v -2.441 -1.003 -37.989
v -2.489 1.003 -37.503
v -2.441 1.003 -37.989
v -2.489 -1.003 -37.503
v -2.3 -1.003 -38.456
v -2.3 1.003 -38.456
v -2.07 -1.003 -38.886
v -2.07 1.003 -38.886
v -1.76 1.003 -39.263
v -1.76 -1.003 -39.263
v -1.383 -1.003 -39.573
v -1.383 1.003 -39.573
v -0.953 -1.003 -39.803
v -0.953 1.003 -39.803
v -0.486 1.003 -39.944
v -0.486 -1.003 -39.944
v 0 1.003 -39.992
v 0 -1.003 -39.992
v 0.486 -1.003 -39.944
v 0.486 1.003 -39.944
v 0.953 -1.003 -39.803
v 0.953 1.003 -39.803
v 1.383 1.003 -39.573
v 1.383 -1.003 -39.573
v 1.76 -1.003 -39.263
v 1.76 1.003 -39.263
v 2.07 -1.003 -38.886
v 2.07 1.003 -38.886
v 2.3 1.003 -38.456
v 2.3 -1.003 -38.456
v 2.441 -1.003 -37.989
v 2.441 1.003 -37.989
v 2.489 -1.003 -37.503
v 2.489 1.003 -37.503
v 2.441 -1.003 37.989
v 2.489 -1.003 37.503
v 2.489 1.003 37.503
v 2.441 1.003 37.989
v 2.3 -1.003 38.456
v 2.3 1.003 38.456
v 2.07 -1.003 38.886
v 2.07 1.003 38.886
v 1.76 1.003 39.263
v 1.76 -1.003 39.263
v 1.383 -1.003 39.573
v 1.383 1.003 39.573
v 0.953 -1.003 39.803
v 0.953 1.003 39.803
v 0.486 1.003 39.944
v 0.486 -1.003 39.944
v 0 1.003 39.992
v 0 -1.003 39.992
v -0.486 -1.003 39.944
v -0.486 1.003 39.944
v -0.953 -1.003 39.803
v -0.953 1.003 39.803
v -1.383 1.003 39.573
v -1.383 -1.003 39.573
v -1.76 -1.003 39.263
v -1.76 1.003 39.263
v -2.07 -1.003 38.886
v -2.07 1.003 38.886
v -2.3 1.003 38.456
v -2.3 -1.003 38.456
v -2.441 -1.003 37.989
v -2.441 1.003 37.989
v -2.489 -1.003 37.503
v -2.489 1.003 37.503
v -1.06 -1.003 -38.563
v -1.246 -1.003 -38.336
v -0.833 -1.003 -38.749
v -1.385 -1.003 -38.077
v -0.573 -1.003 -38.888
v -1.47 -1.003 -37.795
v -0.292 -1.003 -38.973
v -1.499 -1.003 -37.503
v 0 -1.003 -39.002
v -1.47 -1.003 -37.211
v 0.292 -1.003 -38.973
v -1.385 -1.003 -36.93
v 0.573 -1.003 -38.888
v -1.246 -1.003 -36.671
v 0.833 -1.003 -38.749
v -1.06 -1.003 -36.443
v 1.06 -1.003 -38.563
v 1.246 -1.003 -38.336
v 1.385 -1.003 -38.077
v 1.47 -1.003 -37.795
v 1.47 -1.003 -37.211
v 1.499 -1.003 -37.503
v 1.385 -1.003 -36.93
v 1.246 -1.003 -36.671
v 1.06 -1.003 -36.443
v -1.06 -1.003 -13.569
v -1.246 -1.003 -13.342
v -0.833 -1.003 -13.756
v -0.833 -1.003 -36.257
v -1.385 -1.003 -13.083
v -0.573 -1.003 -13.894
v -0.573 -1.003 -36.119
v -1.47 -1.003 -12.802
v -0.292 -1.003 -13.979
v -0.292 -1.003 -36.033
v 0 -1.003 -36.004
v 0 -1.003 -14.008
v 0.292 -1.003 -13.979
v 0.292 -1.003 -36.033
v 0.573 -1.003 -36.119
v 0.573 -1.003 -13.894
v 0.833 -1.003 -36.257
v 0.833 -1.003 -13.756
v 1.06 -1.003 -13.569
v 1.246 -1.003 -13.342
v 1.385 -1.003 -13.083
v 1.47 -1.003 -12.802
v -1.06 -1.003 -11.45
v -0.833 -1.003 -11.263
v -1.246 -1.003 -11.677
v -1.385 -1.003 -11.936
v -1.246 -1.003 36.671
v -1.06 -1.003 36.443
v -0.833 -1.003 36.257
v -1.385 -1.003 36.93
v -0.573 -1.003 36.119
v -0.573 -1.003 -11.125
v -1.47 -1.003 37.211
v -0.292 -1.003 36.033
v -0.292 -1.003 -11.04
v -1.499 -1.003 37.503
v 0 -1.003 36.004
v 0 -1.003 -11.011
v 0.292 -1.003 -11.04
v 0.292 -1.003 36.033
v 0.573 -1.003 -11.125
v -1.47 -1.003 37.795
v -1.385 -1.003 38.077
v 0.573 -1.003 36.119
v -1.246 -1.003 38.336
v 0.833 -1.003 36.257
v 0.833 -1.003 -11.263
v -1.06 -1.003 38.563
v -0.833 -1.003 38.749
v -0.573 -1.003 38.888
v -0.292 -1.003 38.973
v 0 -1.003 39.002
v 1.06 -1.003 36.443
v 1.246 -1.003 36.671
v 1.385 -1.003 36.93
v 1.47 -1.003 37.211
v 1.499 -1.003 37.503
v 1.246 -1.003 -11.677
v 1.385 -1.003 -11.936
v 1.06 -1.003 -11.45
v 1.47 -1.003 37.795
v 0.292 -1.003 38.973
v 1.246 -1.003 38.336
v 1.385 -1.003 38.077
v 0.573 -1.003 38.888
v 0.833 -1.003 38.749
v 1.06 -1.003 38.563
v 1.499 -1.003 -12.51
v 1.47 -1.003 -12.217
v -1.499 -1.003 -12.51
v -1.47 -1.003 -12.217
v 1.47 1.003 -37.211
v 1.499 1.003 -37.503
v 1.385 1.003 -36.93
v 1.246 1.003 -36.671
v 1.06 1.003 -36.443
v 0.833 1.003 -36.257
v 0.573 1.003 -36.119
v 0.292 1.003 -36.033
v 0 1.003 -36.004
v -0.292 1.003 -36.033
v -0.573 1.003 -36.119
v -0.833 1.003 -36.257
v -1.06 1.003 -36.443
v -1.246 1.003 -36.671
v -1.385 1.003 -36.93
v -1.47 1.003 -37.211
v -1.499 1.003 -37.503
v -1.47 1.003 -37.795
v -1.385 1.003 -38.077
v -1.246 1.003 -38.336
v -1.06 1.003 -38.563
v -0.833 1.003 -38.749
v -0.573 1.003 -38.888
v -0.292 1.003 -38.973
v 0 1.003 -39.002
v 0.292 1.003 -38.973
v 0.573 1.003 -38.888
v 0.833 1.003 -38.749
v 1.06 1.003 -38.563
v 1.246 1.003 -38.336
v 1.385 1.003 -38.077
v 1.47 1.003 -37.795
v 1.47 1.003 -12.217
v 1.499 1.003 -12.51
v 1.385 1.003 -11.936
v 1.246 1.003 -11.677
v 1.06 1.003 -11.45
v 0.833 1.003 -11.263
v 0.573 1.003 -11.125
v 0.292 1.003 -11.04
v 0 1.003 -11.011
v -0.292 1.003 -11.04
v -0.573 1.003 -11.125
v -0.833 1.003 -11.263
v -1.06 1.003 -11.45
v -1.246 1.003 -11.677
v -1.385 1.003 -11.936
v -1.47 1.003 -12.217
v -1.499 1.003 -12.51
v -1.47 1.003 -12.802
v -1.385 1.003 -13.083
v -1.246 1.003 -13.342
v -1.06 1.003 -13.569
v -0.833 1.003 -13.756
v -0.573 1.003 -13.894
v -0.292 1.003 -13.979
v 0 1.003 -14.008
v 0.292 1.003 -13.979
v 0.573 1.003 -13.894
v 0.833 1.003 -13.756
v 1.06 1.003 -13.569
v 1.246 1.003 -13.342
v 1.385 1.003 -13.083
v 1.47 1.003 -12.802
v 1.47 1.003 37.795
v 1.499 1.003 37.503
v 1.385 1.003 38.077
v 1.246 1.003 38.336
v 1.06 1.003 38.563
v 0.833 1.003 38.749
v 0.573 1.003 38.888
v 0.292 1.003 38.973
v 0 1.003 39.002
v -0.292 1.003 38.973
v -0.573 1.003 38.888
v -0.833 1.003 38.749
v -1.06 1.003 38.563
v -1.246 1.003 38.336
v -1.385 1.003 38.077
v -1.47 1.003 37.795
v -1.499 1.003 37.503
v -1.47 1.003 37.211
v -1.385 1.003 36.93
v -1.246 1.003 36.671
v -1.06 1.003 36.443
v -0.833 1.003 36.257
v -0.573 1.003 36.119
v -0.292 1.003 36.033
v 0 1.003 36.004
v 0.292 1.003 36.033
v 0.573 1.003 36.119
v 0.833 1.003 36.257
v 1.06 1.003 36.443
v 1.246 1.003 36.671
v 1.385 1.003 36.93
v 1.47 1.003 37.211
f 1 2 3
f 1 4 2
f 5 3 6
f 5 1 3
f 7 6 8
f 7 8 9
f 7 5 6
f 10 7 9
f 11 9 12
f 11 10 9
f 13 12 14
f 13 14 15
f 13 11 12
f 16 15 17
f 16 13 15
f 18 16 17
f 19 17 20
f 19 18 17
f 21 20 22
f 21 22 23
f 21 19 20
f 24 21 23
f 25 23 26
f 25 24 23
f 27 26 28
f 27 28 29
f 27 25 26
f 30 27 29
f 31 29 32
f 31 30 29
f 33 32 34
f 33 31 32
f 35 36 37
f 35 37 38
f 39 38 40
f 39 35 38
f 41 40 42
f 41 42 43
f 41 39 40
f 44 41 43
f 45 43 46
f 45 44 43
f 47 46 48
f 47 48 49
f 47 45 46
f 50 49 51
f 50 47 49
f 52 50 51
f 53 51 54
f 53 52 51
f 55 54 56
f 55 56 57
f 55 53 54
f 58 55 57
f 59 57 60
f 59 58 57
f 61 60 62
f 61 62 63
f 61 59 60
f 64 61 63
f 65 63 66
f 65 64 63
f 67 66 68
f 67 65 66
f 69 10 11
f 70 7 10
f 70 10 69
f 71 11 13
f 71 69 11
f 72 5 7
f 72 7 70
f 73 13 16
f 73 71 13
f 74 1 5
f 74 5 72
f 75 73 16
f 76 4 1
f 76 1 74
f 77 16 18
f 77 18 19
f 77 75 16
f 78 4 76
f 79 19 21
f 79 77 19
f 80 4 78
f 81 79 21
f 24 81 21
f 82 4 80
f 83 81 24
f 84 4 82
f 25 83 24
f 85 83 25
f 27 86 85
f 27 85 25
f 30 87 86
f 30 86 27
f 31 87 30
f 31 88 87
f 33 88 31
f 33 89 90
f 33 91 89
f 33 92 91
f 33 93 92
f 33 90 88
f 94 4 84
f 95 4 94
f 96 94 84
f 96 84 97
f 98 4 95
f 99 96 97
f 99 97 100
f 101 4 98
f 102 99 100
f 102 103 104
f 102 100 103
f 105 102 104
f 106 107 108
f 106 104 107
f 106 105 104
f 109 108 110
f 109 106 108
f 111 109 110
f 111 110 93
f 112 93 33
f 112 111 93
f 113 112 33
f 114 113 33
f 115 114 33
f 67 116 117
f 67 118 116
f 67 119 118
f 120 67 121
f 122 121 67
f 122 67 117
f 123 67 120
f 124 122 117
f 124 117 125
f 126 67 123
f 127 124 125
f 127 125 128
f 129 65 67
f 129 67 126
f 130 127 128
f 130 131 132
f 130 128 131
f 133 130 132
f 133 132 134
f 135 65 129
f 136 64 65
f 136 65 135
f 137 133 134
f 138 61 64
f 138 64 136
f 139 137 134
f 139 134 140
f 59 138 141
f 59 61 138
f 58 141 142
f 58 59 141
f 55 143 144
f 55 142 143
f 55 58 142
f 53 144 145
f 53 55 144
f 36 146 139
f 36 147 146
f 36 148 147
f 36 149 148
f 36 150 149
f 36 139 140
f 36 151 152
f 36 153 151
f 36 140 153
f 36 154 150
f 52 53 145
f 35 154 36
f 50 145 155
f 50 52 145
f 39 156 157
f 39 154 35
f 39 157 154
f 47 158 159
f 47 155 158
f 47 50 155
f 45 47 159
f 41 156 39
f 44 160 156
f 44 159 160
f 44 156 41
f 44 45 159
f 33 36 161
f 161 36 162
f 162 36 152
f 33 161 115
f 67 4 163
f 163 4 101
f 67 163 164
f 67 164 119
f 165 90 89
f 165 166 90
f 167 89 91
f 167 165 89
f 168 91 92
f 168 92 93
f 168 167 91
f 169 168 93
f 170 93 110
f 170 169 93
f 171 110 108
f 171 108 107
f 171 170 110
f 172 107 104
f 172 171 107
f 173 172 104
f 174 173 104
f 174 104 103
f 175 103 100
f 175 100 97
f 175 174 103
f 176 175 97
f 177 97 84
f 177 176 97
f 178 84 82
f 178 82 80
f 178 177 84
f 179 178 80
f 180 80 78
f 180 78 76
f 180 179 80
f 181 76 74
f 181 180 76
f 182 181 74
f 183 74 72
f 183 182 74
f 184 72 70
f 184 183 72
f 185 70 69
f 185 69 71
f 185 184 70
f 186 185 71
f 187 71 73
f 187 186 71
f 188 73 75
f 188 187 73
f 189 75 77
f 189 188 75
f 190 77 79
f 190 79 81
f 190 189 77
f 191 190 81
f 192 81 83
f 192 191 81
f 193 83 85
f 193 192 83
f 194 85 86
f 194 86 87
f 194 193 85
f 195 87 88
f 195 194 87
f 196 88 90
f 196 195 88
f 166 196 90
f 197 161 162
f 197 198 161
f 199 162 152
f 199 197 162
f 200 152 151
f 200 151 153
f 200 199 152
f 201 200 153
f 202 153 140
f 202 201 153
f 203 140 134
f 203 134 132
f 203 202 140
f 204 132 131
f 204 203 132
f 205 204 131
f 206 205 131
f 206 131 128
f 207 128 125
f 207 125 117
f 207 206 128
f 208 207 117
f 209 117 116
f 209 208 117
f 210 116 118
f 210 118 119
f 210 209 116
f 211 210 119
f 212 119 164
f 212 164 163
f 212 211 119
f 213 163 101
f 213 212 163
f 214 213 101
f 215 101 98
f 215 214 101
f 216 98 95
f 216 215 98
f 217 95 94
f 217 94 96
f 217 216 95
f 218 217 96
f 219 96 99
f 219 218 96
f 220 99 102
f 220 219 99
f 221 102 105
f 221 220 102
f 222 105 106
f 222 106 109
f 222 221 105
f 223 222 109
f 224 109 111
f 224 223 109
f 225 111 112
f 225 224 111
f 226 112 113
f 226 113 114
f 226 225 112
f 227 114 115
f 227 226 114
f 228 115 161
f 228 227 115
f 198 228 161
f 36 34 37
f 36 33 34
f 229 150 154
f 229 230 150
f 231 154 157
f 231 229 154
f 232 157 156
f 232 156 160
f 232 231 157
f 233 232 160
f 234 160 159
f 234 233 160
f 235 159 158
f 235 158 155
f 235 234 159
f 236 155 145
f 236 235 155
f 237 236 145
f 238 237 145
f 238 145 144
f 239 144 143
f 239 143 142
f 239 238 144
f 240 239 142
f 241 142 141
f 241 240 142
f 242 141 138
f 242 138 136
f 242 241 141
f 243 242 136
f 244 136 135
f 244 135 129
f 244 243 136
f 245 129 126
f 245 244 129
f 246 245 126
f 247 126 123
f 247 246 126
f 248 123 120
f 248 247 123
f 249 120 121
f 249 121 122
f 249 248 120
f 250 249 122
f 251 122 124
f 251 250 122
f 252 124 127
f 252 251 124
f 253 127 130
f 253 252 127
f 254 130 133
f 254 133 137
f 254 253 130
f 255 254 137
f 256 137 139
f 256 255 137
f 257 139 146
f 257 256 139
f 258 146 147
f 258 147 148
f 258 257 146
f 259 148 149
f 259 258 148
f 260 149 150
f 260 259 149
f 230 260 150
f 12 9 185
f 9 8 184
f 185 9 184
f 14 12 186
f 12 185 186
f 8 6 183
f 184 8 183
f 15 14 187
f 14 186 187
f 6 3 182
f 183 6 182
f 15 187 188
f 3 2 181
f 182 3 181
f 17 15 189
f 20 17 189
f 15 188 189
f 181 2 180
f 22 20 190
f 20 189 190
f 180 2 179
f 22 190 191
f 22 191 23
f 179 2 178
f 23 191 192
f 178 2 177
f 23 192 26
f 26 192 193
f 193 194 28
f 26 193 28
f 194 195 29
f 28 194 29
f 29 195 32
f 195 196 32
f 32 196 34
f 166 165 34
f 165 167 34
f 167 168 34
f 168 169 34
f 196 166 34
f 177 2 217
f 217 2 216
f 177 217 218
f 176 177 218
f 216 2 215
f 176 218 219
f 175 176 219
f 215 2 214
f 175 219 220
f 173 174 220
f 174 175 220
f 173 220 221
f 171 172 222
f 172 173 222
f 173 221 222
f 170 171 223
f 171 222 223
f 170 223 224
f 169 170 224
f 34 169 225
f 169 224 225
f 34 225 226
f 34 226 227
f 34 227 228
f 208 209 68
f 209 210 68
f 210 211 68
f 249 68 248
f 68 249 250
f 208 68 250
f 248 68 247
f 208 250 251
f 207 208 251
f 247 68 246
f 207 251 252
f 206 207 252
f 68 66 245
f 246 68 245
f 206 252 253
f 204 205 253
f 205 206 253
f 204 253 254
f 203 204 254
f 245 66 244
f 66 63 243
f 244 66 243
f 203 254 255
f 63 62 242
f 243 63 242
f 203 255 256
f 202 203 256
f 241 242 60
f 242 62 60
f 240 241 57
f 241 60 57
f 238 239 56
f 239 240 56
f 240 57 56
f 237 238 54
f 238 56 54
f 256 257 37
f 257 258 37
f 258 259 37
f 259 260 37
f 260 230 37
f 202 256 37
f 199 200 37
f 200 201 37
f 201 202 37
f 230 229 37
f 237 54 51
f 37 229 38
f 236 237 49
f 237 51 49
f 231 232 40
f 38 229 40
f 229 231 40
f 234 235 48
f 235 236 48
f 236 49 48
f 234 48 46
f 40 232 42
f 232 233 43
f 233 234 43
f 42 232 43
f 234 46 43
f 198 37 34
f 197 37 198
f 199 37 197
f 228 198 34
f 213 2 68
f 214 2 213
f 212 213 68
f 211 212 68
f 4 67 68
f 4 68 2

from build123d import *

# Parameters (mm, degrees)
F0_R     = 1.4986
F1_DEPTH = 1.0033


with BuildPart() as f1:
    # F0 (on Front) → F1 (new body, symmetric)
    with BuildSketch(Plane.XZ):
        with BuildLine():
            Line((2.4892, -37.5031), (2.4892, 37.5031))
            ThreePointArc((2.4892, 37.5031), (0, 39.9923), (-2.4892, 37.5031))
            Line((-2.4892, 37.5031), (-2.4892, -37.5031))
            ThreePointArc((-2.4892, -37.5031), (0, -39.9923), (2.4892, -37.5031))
        make_face()
        with Locations((0, -37.5031)):
            Circle(F0_R, mode=Mode.SUBTRACT)
        with Locations((0, -12.5095)):
            Circle(F0_R, mode=Mode.SUBTRACT)
        with Locations((0, 37.5031)):
            Circle(F0_R, mode=Mode.SUBTRACT)
    extrude(amount=F1_DEPTH, both=True)


solid = f1.part
